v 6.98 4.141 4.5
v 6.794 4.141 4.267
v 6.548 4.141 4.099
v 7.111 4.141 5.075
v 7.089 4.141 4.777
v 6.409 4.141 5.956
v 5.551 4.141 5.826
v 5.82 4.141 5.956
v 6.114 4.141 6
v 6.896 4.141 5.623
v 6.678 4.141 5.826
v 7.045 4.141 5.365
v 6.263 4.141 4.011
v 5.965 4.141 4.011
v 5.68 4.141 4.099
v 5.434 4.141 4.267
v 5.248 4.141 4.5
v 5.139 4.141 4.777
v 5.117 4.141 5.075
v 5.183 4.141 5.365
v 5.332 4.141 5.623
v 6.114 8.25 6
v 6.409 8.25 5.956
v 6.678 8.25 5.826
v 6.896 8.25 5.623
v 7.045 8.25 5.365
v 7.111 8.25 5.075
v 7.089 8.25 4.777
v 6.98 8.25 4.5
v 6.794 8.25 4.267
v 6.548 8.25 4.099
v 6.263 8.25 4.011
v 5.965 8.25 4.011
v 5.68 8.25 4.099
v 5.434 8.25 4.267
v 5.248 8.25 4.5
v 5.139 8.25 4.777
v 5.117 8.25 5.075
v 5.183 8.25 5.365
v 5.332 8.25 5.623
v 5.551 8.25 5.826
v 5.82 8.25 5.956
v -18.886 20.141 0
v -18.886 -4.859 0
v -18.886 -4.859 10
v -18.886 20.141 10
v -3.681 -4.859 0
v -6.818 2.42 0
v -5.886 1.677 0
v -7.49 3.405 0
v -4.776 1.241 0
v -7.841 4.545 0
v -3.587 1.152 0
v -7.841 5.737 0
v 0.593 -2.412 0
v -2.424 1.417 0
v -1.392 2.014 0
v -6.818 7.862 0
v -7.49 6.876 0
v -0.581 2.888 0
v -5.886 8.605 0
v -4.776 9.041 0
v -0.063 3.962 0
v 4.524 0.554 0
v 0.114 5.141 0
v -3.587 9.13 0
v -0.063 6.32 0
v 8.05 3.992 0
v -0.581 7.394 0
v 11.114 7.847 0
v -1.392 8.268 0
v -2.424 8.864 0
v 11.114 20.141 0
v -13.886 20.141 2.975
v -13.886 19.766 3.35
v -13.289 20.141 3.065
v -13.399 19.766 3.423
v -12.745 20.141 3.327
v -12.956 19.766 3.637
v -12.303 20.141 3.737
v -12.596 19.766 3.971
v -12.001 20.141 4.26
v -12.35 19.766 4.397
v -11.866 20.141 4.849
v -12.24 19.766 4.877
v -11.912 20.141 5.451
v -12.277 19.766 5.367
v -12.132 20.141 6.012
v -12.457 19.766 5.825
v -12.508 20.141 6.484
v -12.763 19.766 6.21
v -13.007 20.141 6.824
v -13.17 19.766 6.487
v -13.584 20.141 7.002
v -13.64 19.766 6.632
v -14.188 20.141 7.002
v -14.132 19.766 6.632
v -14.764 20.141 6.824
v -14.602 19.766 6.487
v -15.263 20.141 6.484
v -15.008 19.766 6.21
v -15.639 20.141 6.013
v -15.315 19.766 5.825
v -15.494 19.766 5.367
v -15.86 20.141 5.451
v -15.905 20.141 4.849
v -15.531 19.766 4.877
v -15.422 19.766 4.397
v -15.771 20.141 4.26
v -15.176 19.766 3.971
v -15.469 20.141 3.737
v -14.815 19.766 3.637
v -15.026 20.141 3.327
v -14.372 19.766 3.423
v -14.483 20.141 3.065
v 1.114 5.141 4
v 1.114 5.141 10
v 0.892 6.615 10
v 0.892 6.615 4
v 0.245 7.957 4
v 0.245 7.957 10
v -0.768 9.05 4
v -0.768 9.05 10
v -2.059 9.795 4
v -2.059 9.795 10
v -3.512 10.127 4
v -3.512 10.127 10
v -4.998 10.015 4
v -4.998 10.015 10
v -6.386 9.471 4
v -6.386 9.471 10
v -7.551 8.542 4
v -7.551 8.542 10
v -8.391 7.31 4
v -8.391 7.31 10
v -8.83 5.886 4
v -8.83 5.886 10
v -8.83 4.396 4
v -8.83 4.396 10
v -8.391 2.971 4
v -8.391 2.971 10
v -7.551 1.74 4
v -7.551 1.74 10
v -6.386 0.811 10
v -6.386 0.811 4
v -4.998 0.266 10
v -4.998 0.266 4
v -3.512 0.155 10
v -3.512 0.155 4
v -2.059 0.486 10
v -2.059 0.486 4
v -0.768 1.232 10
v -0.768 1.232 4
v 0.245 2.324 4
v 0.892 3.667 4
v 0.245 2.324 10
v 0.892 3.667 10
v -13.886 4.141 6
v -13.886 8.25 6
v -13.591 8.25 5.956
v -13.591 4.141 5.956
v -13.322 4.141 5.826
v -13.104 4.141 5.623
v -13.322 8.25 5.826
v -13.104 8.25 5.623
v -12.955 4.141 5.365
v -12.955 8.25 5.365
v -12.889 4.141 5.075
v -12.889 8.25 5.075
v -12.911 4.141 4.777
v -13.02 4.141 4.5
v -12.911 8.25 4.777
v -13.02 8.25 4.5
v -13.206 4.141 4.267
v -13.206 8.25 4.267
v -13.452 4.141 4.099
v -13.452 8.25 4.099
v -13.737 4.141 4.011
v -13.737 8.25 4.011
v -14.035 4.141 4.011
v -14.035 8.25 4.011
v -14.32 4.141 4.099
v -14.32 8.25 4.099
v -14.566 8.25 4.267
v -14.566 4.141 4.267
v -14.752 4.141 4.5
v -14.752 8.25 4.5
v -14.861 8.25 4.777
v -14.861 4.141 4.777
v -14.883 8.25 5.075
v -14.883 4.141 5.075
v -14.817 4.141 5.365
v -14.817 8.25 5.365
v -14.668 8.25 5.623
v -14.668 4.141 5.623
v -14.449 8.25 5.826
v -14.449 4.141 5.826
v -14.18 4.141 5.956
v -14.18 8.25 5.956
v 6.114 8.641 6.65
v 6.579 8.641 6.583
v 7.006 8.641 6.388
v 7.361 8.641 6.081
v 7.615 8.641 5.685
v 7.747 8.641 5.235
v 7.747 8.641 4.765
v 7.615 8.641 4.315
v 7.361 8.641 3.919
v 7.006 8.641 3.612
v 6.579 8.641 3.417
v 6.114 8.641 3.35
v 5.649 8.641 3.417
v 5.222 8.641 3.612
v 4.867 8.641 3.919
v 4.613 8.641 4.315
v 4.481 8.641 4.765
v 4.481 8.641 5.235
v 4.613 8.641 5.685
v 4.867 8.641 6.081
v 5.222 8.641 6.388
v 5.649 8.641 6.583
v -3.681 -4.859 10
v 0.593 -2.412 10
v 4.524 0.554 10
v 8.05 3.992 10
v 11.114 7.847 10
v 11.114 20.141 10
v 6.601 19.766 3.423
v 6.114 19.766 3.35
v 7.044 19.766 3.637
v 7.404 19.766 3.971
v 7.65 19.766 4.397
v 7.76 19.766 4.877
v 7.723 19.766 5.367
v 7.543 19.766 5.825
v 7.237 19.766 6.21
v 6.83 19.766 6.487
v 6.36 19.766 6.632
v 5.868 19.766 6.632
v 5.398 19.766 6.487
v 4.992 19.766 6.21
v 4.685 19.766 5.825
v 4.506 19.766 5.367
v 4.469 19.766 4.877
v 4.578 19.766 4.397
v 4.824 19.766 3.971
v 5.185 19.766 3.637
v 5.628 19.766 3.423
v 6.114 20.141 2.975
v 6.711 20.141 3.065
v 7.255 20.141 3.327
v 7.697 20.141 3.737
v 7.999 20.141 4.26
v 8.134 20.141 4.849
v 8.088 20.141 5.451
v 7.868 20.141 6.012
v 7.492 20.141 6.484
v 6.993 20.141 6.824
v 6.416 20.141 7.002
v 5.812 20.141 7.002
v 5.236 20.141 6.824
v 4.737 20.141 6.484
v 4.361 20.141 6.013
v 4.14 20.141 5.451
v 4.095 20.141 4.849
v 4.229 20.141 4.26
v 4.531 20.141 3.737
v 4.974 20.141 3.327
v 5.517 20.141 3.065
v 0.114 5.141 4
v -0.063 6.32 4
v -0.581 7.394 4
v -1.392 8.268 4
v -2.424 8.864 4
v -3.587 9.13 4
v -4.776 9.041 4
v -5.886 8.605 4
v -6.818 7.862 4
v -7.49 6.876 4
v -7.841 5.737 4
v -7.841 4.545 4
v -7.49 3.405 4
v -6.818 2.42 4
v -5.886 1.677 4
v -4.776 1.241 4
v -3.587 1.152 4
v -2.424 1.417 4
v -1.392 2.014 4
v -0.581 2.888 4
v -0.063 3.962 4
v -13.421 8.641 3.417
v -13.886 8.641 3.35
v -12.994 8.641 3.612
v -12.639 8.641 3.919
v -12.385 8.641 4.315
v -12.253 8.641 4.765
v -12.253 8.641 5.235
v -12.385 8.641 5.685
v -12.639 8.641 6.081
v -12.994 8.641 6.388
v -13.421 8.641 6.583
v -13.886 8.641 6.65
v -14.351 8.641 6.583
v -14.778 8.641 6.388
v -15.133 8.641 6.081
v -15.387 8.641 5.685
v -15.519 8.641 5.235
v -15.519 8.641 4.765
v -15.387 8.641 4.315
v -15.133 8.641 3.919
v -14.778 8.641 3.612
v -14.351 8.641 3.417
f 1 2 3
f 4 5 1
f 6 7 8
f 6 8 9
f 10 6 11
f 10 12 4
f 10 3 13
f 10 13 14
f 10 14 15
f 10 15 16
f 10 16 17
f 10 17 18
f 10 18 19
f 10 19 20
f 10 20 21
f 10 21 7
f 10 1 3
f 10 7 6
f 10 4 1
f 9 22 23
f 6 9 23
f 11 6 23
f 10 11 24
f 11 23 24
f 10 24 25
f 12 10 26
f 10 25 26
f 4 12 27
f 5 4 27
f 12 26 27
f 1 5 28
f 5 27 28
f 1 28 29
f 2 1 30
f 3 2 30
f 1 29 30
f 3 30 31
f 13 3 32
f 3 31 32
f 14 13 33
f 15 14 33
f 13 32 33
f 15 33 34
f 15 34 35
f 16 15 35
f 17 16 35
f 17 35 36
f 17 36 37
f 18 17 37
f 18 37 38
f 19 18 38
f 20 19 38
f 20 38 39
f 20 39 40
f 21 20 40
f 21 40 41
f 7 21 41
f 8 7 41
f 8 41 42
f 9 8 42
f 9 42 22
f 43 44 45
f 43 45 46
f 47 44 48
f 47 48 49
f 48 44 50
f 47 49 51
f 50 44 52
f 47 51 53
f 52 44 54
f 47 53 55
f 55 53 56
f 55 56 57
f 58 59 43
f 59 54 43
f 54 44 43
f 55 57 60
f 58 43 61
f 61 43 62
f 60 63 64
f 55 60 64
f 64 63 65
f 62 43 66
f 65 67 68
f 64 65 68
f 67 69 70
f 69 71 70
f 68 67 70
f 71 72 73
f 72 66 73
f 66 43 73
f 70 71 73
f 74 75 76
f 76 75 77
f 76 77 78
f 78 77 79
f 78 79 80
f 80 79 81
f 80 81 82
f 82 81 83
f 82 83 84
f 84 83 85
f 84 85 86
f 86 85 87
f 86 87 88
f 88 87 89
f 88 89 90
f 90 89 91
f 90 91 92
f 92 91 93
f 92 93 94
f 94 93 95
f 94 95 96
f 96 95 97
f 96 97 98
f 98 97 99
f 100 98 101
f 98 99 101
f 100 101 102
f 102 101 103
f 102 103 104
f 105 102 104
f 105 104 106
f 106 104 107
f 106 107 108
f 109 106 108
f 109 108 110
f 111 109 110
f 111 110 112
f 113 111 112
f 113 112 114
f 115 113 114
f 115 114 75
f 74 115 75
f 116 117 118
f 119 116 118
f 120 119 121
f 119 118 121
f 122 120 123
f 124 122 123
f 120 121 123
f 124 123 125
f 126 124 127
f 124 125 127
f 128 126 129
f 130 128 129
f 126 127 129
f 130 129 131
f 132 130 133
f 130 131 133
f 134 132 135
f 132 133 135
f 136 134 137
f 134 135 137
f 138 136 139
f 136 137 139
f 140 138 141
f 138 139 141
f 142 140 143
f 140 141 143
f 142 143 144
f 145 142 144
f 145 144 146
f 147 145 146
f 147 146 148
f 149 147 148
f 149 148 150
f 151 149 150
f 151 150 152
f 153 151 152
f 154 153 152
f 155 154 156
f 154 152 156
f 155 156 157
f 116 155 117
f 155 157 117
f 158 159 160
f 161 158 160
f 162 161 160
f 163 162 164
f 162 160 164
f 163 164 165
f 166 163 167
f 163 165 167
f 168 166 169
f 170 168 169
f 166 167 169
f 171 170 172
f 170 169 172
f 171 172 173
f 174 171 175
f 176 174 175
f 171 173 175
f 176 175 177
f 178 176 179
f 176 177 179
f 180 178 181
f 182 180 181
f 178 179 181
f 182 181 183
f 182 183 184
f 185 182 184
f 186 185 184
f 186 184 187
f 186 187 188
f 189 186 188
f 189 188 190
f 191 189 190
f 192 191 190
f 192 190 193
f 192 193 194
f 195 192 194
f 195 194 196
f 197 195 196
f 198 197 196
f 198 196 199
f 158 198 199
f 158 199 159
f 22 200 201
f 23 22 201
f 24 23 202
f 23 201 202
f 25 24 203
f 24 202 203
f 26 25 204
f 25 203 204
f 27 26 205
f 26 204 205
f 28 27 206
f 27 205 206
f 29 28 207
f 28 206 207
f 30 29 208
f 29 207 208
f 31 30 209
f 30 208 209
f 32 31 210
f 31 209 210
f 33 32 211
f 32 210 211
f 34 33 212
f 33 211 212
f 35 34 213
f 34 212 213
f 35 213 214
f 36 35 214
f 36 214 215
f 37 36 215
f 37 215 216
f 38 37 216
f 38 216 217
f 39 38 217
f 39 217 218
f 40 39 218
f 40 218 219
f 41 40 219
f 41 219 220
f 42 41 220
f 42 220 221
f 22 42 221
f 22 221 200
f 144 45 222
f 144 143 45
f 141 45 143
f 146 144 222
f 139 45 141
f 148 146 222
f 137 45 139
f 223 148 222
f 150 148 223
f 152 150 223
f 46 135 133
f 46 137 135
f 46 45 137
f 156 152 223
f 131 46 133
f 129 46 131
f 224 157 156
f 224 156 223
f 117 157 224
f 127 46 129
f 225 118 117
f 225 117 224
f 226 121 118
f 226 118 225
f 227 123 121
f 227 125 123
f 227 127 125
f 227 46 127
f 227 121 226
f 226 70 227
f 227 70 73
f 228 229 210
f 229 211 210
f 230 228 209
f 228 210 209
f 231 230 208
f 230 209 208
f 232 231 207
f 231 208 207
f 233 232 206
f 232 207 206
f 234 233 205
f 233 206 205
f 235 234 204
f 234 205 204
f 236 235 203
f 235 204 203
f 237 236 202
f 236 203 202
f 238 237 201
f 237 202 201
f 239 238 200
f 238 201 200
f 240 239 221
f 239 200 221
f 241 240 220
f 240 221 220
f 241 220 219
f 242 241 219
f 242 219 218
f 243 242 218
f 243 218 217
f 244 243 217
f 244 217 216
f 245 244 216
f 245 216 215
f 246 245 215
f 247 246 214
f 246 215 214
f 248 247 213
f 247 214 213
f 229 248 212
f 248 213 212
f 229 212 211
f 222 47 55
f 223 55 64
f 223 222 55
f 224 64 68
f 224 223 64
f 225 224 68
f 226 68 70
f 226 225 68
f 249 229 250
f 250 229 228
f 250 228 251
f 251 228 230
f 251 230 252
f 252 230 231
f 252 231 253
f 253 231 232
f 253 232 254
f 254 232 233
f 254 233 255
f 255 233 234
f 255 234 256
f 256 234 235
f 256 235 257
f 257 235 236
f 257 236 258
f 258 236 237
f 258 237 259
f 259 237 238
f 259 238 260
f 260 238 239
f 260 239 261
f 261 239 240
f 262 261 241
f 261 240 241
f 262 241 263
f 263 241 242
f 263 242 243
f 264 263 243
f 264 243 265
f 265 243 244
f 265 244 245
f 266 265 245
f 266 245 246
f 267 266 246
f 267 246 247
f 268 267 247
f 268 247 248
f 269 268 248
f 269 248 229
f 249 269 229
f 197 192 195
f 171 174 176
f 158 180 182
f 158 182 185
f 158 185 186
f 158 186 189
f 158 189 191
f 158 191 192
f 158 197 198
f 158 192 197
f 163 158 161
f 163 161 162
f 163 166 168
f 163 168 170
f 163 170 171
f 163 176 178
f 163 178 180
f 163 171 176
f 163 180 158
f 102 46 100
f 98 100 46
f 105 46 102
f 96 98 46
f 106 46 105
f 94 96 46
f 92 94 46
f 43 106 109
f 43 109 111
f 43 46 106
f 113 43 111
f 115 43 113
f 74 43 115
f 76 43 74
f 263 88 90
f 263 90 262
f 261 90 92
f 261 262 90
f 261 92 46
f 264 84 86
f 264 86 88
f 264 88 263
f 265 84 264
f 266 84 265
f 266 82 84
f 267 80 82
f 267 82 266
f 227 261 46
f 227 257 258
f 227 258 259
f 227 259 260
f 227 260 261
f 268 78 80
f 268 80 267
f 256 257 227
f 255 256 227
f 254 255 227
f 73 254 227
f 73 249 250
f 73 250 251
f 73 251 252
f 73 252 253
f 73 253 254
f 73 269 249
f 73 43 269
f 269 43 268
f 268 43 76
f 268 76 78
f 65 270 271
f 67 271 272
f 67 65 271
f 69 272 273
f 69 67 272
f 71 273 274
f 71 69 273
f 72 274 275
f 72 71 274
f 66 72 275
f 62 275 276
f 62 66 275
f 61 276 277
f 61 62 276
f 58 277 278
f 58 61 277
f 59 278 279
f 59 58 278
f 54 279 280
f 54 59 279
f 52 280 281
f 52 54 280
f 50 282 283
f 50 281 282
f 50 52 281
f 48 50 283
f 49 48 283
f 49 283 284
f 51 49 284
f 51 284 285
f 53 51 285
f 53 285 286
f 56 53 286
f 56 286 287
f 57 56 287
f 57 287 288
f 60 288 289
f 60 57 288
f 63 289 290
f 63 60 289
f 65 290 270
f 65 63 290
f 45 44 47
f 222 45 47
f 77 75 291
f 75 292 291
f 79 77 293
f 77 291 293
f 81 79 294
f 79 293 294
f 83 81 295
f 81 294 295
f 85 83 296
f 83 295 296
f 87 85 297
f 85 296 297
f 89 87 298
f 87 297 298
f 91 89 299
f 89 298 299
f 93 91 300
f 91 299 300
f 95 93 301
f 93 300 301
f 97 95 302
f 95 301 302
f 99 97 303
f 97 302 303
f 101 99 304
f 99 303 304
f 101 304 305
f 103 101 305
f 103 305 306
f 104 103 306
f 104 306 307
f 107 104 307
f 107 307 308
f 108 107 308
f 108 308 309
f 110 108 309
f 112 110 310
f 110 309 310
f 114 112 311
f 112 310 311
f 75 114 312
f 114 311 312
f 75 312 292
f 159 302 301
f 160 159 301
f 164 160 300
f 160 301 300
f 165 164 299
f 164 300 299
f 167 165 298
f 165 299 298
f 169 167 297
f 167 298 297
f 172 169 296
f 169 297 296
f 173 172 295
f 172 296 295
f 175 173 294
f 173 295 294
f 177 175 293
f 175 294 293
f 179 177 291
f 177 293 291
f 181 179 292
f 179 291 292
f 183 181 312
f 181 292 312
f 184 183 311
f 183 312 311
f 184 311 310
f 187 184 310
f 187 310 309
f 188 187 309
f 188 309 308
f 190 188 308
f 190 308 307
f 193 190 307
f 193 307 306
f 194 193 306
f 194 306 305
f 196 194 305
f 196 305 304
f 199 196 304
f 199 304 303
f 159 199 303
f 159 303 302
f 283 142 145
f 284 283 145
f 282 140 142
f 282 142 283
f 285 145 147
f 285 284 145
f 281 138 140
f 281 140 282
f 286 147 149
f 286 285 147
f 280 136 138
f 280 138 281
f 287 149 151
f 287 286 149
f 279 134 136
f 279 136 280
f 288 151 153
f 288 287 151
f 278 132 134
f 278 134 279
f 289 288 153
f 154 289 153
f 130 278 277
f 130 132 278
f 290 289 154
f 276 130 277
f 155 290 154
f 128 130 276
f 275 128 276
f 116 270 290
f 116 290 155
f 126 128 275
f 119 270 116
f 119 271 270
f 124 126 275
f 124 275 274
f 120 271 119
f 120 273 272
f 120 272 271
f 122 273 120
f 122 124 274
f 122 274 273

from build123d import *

# Parameters (mm, degrees)
SKIZZE1_W                       = 30
SKIZZE1_H                       = 25
SKIZZE1_R                       = 4
AUFSATZ_LINEAR_AUSTRAGEN1_DEPTH = 10
SKIZZE2_R                       = 5
SCHNITT_LINEAR_AUSTRAGEN1_DEPTH = 6
SKIZZE3_R                       = 1
SCHNITT_LINEAR_AUSTRAGEN2_DEPTH = 16
M4_GEWINDEBOHRUNG1_D            = 3.3
M4_GEWINDEBOHRUNG1_DEPTH        = 11.5
M4_GEWINDEBOHRUNG1_CSINK_D      = 4.05
M4_GEWINDEBOHRUNG1_CSINK_ANGLE  = 90
M4_GEWINDEBOHRUNG1_TIP          = 0.991420021
SKIZZE5_R                       = 51.207337477
SKIZZE5_R_2                     = 39
SCHNITT_LINEAR_AUSTRAGEN3_DEPTH = 10


with BuildPart() as part:
    # Skizze1 → Aufsatz-Linear austragen1 (new body)
    with BuildSketch(Plane.XY):
        with Locations((-3.885739266, 7.64084507)):
            Rectangle(SKIZZE1_W, SKIZZE1_H)
        with Locations((-3.885739266, 5.14084507)):
            Circle(SKIZZE1_R, mode=Mode.SUBTRACT)
    extrude(amount=AUFSATZ_LINEAR_AUSTRAGEN1_DEPTH)

    # Skizze2 → Schnitt-Linear austragen1 (cut)
    with BuildSketch(Plane.XY.offset(10)):
        with Locations((-3.885739266, 5.14084507)):
            Circle(SKIZZE2_R)
    extrude(amount=-SCHNITT_LINEAR_AUSTRAGEN1_DEPTH, mode=Mode.SUBTRACT)

    # Skizze3 → Schnitt-Linear austragen2 (cut)
    with BuildSketch(Plane(origin=(0, 20.14084507, 0), x_dir=(1, 0, 0), z_dir=(0, 1, 0))):
        with Locations(Location((-13.885739266, -5, 0), (0, 0, 270))):
            Circle(SKIZZE3_R)
        with Locations(Location((6.114260734, -5, 0), (0, 0, 270))):
            Circle(SKIZZE3_R)
    extrude(amount=-SCHNITT_LINEAR_AUSTRAGEN2_DEPTH, mode=Mode.SUBTRACT)

    # M4 Gewindebohrung1
    with Locations(Plane(origin=(-13.885739266, 20.14084507, 5), x_dir=(0, 0, 1), z_dir=(0, 1, 0))):
        with Locations((0, 0), (0, 20)):
            CounterSinkHole(M4_GEWINDEBOHRUNG1_D / 2, M4_GEWINDEBOHRUNG1_CSINK_D / 2, depth=M4_GEWINDEBOHRUNG1_DEPTH, counter_sink_angle=M4_GEWINDEBOHRUNG1_CSINK_ANGLE)
            with Locations((0, 0, -(M4_GEWINDEBOHRUNG1_DEPTH + M4_GEWINDEBOHRUNG1_TIP / 2))):  # 118° drill point
                Cone(0, M4_GEWINDEBOHRUNG1_D / 2, M4_GEWINDEBOHRUNG1_TIP, mode=Mode.SUBTRACT)

    # Skizze5 → Schnitt-Linear austragen3 (cut)
    with BuildSketch(Plane.XY.offset(10)):
        with Locations((-20.885739266, 30.14084507)):
            Circle(SKIZZE5_R)
        with Locations((-20.885739266, 30.14084507)):
            Circle(SKIZZE5_R_2, mode=Mode.SUBTRACT)
    extrude(amount=-SCHNITT_LINEAR_AUSTRAGEN3_DEPTH, mode=Mode.SUBTRACT)


solid = part.part
